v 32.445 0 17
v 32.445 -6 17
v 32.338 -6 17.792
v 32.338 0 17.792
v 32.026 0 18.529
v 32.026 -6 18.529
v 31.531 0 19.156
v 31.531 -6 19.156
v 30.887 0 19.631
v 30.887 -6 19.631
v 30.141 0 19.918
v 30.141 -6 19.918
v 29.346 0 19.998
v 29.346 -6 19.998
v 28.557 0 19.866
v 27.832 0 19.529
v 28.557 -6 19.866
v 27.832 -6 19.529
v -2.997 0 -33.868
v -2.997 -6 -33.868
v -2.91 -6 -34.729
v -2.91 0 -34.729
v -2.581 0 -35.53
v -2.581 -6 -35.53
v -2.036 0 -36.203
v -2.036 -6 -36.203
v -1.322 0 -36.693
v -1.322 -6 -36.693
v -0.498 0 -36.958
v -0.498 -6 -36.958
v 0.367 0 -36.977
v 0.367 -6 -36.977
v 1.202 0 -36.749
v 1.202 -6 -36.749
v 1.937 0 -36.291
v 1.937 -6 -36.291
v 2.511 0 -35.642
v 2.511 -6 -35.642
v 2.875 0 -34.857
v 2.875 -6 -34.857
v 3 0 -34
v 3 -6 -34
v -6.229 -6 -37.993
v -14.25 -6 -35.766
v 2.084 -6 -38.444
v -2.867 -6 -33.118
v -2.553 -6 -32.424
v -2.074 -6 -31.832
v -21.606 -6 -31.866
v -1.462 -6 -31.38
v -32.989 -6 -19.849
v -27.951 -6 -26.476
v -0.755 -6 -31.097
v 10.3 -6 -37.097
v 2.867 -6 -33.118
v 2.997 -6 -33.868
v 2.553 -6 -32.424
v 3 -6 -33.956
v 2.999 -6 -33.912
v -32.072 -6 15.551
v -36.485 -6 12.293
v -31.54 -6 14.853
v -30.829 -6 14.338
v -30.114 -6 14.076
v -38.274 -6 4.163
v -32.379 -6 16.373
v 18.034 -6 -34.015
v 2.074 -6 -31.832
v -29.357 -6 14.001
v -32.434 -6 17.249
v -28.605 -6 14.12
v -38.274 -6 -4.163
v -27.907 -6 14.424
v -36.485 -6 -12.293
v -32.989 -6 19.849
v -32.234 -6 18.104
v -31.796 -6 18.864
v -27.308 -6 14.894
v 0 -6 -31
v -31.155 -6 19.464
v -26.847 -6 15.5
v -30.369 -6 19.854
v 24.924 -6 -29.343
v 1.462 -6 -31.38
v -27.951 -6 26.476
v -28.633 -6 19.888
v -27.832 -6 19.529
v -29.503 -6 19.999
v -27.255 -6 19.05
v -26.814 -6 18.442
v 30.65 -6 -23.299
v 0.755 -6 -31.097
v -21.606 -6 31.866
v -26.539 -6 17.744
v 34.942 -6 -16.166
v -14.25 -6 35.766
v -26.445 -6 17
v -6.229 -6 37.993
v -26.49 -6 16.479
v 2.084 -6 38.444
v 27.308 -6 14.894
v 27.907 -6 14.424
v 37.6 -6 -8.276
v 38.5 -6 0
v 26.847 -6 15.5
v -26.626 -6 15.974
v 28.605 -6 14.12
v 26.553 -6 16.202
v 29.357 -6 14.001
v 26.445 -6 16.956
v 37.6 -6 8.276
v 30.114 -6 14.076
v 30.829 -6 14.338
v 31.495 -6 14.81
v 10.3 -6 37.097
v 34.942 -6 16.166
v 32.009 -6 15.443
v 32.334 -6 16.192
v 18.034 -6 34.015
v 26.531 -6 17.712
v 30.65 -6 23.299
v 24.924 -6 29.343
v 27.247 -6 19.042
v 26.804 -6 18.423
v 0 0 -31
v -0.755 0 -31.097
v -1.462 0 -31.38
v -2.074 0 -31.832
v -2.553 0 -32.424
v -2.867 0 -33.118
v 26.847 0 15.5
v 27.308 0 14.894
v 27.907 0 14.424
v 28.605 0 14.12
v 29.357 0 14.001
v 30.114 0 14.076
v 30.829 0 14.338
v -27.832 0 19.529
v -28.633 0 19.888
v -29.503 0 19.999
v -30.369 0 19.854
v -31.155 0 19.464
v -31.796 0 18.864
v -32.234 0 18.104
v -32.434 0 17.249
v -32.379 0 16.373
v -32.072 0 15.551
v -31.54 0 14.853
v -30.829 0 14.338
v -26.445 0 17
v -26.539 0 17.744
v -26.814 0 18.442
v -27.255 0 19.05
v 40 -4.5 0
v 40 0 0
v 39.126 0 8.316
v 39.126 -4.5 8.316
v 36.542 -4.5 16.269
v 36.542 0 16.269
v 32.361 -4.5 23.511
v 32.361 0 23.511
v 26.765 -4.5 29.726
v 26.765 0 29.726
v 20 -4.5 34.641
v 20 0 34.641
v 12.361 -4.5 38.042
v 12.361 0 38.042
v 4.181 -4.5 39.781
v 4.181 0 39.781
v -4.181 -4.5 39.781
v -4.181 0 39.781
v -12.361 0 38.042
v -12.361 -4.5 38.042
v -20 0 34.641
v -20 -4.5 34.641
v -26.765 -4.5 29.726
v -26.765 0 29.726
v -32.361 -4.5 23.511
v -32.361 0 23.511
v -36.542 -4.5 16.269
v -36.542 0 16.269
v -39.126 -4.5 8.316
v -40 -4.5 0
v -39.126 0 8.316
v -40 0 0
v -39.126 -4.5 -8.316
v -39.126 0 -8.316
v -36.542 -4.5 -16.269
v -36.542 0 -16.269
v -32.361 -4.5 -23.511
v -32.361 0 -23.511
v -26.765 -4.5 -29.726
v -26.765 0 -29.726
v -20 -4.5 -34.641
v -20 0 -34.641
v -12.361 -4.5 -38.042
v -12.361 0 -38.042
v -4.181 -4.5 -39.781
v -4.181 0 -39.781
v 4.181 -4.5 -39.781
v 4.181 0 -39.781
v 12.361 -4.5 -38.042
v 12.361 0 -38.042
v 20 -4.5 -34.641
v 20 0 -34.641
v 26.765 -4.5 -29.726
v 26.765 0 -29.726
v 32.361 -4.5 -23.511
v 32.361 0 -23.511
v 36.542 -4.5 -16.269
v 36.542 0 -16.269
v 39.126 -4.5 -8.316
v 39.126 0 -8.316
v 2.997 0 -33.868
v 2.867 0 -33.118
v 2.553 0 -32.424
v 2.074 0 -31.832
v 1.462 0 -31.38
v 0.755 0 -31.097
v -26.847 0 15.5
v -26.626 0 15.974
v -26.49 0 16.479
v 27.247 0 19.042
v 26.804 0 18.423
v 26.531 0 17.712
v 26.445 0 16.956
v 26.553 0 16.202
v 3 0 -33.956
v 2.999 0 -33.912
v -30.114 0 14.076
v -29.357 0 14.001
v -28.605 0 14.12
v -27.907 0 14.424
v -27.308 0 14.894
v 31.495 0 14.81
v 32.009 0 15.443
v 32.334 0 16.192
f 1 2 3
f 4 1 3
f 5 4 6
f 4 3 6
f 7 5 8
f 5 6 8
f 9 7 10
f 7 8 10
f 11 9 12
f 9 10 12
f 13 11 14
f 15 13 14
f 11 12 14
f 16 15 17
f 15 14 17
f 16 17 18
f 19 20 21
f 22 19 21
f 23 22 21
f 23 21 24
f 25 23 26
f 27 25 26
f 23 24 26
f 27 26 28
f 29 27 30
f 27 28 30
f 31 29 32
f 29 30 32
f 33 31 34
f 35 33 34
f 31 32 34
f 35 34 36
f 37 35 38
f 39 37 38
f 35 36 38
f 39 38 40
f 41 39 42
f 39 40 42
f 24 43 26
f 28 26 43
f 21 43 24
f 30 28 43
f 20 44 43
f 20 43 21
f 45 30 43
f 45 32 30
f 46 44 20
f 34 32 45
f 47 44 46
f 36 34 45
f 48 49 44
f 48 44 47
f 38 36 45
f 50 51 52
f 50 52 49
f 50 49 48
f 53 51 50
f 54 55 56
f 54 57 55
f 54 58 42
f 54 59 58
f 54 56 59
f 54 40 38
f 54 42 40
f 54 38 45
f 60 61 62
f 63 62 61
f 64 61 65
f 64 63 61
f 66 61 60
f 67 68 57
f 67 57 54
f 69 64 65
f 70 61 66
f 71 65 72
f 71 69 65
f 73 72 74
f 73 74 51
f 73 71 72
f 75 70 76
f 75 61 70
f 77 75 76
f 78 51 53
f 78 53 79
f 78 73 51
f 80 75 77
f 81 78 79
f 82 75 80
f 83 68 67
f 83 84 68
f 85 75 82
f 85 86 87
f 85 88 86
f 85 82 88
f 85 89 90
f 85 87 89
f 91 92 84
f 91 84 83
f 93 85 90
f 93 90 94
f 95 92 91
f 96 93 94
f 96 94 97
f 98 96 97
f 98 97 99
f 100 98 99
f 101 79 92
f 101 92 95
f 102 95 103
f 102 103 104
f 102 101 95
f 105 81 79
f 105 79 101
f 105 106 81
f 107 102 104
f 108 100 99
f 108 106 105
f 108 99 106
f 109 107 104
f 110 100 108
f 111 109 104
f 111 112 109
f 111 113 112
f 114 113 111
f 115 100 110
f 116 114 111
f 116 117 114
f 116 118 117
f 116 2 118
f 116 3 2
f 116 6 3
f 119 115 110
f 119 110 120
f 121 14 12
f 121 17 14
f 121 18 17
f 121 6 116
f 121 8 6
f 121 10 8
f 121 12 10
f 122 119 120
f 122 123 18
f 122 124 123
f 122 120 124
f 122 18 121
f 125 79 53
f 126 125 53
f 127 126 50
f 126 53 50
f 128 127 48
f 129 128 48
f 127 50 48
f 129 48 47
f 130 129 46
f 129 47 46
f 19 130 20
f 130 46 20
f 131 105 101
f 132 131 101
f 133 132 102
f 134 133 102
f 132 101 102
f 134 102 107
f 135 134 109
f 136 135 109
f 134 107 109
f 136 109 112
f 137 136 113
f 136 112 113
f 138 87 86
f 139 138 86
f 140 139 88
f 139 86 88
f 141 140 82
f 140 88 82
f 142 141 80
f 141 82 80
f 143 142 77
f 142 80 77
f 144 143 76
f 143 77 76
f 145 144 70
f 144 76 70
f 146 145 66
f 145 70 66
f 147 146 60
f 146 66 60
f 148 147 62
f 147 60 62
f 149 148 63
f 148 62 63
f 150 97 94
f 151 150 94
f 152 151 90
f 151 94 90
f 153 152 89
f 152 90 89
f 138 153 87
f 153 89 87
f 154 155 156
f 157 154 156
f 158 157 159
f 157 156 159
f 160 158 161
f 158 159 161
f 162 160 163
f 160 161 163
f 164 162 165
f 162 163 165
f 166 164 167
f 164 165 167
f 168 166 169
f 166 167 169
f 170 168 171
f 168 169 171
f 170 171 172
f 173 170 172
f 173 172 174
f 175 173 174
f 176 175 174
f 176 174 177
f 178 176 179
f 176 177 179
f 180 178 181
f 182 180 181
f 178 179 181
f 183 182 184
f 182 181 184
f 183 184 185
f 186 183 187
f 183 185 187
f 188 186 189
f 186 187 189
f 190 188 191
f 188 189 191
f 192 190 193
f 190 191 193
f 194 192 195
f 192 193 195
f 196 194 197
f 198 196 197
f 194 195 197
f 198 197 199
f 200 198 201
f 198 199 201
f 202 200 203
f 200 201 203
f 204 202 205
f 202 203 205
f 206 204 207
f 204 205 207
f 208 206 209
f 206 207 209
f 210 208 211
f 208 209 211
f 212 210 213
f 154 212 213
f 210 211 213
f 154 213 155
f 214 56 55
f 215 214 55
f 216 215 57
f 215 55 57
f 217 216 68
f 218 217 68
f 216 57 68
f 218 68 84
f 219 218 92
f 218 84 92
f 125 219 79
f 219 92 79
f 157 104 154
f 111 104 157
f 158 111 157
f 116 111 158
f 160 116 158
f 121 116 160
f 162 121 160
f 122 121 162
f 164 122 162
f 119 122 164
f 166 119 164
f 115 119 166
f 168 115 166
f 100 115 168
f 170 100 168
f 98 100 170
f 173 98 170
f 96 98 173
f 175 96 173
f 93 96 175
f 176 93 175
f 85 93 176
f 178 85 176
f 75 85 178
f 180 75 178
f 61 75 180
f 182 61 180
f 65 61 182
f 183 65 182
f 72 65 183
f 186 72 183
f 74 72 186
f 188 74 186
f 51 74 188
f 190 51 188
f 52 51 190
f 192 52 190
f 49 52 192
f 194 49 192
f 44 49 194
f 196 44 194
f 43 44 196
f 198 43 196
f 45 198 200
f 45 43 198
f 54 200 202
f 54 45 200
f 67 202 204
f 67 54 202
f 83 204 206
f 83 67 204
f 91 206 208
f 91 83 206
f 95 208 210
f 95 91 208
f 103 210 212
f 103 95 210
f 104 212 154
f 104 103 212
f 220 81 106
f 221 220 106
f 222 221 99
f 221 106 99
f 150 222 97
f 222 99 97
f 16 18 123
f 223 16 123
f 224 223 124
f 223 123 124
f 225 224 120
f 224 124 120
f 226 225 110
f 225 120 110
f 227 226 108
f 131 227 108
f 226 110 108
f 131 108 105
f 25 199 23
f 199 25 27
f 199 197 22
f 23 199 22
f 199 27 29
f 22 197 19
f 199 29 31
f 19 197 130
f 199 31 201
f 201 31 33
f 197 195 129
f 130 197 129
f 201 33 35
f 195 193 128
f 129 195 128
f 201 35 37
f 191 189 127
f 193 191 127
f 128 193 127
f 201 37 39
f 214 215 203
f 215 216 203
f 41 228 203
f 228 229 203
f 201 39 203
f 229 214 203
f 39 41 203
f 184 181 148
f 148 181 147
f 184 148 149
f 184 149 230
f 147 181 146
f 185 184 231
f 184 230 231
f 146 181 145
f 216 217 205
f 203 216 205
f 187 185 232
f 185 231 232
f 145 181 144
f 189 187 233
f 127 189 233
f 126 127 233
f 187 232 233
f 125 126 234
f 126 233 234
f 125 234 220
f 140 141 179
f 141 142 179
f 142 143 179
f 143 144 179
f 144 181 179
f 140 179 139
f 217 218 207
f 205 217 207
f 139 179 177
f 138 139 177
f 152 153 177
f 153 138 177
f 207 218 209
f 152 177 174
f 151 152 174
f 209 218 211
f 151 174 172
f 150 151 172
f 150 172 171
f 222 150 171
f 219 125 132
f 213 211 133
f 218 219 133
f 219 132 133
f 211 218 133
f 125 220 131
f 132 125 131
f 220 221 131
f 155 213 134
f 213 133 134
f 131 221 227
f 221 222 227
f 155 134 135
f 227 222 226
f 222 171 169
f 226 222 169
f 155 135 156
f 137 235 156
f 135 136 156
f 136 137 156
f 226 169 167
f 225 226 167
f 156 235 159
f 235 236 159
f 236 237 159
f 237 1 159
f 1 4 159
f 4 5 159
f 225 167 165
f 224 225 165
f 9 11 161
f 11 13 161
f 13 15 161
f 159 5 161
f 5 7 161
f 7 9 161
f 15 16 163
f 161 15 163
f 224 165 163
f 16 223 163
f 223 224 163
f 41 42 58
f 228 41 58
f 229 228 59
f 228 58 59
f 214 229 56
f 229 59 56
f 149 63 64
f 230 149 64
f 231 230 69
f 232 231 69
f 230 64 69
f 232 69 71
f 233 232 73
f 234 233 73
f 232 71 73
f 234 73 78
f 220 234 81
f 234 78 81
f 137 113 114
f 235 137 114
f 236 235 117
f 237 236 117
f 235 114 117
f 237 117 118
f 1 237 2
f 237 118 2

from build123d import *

# Parameters (mm, degrees)
F0_R     = 40
F1_DEPTH = 6
F2_SIZE  = 1.5
F4_DEPTH = 25


with BuildPart() as f1:
    # F0 (on Front) → F1 (new body)
    with BuildSketch(Plane.XZ):
        Circle(F0_R)
    extrude(amount=F1_DEPTH)

    # F2
    f2_edges = [f1.edges().sort_by_distance(p)[0] for p in [
        (-40, -6, 0),
    ]]
    chamfer(f2_edges, length=F2_SIZE)

    # F3 (on face) → F4 (cut)
    with BuildSketch(Plane.XZ.offset(6)):
        with BuildLine():
            ThreePointArc((-29.444864, 17), (-28.666195, 18.282486), (-27.831703, 19.52937))
            ThreePointArc((-27.831703, 19.52937), (-32.04294, 18.5), (-30.828782, 14.338277))
            ThreePointArc((-30.828782, 14.338277), (-30.166195, 15.68441), (-29.444864, 17))
        make_face()
        with BuildLine():
            ThreePointArc((-30.828782, 14.338277), (-28.604658, 14.12006), (-26.846788, 15.5))
            Line((-26.846788, 15.5), (-29.444864, 17))
            ThreePointArc((-29.444864, 17), (-30.166195, 15.68441), (-30.828782, 14.338277))
        make_face()
        with BuildLine():
            ThreePointArc((-26.444864, 17), (-26.814324, 18.44231), (-27.831703, 19.52937))
            ThreePointArc((-27.831703, 19.52937), (-28.666195, 18.282486), (-29.444864, 17))
            Line((-29.444864, 17), (-26.846788, 15.5))
            ThreePointArc((-26.846788, 15.5), (-26.547086, 16.223543), (-26.444864, 17))
        make_face()
        with BuildLine():
            ThreePointArc((29.444864, 17), (30.166195, 15.68441), (30.828782, 14.338277))
            ThreePointArc((30.828782, 14.338277), (32.009211, 15.443041), (32.444864, 17))
            ThreePointArc((32.444864, 17), (30.887174, 19.63054), (27.831703, 19.52937))
            ThreePointArc((27.831703, 19.52937), (28.666195, 18.282486), (29.444864, 17))
        make_face()
        with BuildLine():
            ThreePointArc((26.846788, 15.5), (28.604658, 14.12006), (30.828782, 14.338277))
            ThreePointArc((30.828782, 14.338277), (30.166195, 15.68441), (29.444864, 17))
            Line((29.444864, 17), (26.846788, 15.5))
        make_face()
        with BuildLine():
            Line((26.846788, 15.5), (29.444864, 17))
            ThreePointArc((29.444864, 17), (28.666195, 18.282486), (27.831703, 19.52937))
            ThreePointArc((27.831703, 19.52937), (26.53066, 17.712331), (26.846788, 15.5))
        make_face()
        with BuildLine():
            ThreePointArc((-2.997079, -33.867647), (-1.5, -33.966896), (0, -34))
            Line((0, -34), (0, -31))
            ThreePointArc((0, -31), (-2.073999, -31.832391), (-2.997079, -33.867647))
        make_face()
        with BuildLine():
            ThreePointArc((0, -34), (1.5, -33.966896), (2.997079, -33.867647))
            ThreePointArc((2.997079, -33.867647), (2.073999, -31.832391), (0, -31))
            Line((0, -31), (0, -34))
        make_face()
        with BuildLine():
            ThreePointArc((3, -34), (2.99927, -33.933807), (2.997079, -33.867647))
            ThreePointArc((2.997079, -33.867647), (1.5, -33.966896), (0, -34))
            ThreePointArc((0, -34), (-1.5, -33.966896), (-2.997079, -33.867647))
            ThreePointArc((-2.997079, -33.867647), (-0.066193, -36.99927), (3, -34))
        make_face()
    extrude(amount=-F4_DEPTH, mode=Mode.SUBTRACT)


solid = f1.part
